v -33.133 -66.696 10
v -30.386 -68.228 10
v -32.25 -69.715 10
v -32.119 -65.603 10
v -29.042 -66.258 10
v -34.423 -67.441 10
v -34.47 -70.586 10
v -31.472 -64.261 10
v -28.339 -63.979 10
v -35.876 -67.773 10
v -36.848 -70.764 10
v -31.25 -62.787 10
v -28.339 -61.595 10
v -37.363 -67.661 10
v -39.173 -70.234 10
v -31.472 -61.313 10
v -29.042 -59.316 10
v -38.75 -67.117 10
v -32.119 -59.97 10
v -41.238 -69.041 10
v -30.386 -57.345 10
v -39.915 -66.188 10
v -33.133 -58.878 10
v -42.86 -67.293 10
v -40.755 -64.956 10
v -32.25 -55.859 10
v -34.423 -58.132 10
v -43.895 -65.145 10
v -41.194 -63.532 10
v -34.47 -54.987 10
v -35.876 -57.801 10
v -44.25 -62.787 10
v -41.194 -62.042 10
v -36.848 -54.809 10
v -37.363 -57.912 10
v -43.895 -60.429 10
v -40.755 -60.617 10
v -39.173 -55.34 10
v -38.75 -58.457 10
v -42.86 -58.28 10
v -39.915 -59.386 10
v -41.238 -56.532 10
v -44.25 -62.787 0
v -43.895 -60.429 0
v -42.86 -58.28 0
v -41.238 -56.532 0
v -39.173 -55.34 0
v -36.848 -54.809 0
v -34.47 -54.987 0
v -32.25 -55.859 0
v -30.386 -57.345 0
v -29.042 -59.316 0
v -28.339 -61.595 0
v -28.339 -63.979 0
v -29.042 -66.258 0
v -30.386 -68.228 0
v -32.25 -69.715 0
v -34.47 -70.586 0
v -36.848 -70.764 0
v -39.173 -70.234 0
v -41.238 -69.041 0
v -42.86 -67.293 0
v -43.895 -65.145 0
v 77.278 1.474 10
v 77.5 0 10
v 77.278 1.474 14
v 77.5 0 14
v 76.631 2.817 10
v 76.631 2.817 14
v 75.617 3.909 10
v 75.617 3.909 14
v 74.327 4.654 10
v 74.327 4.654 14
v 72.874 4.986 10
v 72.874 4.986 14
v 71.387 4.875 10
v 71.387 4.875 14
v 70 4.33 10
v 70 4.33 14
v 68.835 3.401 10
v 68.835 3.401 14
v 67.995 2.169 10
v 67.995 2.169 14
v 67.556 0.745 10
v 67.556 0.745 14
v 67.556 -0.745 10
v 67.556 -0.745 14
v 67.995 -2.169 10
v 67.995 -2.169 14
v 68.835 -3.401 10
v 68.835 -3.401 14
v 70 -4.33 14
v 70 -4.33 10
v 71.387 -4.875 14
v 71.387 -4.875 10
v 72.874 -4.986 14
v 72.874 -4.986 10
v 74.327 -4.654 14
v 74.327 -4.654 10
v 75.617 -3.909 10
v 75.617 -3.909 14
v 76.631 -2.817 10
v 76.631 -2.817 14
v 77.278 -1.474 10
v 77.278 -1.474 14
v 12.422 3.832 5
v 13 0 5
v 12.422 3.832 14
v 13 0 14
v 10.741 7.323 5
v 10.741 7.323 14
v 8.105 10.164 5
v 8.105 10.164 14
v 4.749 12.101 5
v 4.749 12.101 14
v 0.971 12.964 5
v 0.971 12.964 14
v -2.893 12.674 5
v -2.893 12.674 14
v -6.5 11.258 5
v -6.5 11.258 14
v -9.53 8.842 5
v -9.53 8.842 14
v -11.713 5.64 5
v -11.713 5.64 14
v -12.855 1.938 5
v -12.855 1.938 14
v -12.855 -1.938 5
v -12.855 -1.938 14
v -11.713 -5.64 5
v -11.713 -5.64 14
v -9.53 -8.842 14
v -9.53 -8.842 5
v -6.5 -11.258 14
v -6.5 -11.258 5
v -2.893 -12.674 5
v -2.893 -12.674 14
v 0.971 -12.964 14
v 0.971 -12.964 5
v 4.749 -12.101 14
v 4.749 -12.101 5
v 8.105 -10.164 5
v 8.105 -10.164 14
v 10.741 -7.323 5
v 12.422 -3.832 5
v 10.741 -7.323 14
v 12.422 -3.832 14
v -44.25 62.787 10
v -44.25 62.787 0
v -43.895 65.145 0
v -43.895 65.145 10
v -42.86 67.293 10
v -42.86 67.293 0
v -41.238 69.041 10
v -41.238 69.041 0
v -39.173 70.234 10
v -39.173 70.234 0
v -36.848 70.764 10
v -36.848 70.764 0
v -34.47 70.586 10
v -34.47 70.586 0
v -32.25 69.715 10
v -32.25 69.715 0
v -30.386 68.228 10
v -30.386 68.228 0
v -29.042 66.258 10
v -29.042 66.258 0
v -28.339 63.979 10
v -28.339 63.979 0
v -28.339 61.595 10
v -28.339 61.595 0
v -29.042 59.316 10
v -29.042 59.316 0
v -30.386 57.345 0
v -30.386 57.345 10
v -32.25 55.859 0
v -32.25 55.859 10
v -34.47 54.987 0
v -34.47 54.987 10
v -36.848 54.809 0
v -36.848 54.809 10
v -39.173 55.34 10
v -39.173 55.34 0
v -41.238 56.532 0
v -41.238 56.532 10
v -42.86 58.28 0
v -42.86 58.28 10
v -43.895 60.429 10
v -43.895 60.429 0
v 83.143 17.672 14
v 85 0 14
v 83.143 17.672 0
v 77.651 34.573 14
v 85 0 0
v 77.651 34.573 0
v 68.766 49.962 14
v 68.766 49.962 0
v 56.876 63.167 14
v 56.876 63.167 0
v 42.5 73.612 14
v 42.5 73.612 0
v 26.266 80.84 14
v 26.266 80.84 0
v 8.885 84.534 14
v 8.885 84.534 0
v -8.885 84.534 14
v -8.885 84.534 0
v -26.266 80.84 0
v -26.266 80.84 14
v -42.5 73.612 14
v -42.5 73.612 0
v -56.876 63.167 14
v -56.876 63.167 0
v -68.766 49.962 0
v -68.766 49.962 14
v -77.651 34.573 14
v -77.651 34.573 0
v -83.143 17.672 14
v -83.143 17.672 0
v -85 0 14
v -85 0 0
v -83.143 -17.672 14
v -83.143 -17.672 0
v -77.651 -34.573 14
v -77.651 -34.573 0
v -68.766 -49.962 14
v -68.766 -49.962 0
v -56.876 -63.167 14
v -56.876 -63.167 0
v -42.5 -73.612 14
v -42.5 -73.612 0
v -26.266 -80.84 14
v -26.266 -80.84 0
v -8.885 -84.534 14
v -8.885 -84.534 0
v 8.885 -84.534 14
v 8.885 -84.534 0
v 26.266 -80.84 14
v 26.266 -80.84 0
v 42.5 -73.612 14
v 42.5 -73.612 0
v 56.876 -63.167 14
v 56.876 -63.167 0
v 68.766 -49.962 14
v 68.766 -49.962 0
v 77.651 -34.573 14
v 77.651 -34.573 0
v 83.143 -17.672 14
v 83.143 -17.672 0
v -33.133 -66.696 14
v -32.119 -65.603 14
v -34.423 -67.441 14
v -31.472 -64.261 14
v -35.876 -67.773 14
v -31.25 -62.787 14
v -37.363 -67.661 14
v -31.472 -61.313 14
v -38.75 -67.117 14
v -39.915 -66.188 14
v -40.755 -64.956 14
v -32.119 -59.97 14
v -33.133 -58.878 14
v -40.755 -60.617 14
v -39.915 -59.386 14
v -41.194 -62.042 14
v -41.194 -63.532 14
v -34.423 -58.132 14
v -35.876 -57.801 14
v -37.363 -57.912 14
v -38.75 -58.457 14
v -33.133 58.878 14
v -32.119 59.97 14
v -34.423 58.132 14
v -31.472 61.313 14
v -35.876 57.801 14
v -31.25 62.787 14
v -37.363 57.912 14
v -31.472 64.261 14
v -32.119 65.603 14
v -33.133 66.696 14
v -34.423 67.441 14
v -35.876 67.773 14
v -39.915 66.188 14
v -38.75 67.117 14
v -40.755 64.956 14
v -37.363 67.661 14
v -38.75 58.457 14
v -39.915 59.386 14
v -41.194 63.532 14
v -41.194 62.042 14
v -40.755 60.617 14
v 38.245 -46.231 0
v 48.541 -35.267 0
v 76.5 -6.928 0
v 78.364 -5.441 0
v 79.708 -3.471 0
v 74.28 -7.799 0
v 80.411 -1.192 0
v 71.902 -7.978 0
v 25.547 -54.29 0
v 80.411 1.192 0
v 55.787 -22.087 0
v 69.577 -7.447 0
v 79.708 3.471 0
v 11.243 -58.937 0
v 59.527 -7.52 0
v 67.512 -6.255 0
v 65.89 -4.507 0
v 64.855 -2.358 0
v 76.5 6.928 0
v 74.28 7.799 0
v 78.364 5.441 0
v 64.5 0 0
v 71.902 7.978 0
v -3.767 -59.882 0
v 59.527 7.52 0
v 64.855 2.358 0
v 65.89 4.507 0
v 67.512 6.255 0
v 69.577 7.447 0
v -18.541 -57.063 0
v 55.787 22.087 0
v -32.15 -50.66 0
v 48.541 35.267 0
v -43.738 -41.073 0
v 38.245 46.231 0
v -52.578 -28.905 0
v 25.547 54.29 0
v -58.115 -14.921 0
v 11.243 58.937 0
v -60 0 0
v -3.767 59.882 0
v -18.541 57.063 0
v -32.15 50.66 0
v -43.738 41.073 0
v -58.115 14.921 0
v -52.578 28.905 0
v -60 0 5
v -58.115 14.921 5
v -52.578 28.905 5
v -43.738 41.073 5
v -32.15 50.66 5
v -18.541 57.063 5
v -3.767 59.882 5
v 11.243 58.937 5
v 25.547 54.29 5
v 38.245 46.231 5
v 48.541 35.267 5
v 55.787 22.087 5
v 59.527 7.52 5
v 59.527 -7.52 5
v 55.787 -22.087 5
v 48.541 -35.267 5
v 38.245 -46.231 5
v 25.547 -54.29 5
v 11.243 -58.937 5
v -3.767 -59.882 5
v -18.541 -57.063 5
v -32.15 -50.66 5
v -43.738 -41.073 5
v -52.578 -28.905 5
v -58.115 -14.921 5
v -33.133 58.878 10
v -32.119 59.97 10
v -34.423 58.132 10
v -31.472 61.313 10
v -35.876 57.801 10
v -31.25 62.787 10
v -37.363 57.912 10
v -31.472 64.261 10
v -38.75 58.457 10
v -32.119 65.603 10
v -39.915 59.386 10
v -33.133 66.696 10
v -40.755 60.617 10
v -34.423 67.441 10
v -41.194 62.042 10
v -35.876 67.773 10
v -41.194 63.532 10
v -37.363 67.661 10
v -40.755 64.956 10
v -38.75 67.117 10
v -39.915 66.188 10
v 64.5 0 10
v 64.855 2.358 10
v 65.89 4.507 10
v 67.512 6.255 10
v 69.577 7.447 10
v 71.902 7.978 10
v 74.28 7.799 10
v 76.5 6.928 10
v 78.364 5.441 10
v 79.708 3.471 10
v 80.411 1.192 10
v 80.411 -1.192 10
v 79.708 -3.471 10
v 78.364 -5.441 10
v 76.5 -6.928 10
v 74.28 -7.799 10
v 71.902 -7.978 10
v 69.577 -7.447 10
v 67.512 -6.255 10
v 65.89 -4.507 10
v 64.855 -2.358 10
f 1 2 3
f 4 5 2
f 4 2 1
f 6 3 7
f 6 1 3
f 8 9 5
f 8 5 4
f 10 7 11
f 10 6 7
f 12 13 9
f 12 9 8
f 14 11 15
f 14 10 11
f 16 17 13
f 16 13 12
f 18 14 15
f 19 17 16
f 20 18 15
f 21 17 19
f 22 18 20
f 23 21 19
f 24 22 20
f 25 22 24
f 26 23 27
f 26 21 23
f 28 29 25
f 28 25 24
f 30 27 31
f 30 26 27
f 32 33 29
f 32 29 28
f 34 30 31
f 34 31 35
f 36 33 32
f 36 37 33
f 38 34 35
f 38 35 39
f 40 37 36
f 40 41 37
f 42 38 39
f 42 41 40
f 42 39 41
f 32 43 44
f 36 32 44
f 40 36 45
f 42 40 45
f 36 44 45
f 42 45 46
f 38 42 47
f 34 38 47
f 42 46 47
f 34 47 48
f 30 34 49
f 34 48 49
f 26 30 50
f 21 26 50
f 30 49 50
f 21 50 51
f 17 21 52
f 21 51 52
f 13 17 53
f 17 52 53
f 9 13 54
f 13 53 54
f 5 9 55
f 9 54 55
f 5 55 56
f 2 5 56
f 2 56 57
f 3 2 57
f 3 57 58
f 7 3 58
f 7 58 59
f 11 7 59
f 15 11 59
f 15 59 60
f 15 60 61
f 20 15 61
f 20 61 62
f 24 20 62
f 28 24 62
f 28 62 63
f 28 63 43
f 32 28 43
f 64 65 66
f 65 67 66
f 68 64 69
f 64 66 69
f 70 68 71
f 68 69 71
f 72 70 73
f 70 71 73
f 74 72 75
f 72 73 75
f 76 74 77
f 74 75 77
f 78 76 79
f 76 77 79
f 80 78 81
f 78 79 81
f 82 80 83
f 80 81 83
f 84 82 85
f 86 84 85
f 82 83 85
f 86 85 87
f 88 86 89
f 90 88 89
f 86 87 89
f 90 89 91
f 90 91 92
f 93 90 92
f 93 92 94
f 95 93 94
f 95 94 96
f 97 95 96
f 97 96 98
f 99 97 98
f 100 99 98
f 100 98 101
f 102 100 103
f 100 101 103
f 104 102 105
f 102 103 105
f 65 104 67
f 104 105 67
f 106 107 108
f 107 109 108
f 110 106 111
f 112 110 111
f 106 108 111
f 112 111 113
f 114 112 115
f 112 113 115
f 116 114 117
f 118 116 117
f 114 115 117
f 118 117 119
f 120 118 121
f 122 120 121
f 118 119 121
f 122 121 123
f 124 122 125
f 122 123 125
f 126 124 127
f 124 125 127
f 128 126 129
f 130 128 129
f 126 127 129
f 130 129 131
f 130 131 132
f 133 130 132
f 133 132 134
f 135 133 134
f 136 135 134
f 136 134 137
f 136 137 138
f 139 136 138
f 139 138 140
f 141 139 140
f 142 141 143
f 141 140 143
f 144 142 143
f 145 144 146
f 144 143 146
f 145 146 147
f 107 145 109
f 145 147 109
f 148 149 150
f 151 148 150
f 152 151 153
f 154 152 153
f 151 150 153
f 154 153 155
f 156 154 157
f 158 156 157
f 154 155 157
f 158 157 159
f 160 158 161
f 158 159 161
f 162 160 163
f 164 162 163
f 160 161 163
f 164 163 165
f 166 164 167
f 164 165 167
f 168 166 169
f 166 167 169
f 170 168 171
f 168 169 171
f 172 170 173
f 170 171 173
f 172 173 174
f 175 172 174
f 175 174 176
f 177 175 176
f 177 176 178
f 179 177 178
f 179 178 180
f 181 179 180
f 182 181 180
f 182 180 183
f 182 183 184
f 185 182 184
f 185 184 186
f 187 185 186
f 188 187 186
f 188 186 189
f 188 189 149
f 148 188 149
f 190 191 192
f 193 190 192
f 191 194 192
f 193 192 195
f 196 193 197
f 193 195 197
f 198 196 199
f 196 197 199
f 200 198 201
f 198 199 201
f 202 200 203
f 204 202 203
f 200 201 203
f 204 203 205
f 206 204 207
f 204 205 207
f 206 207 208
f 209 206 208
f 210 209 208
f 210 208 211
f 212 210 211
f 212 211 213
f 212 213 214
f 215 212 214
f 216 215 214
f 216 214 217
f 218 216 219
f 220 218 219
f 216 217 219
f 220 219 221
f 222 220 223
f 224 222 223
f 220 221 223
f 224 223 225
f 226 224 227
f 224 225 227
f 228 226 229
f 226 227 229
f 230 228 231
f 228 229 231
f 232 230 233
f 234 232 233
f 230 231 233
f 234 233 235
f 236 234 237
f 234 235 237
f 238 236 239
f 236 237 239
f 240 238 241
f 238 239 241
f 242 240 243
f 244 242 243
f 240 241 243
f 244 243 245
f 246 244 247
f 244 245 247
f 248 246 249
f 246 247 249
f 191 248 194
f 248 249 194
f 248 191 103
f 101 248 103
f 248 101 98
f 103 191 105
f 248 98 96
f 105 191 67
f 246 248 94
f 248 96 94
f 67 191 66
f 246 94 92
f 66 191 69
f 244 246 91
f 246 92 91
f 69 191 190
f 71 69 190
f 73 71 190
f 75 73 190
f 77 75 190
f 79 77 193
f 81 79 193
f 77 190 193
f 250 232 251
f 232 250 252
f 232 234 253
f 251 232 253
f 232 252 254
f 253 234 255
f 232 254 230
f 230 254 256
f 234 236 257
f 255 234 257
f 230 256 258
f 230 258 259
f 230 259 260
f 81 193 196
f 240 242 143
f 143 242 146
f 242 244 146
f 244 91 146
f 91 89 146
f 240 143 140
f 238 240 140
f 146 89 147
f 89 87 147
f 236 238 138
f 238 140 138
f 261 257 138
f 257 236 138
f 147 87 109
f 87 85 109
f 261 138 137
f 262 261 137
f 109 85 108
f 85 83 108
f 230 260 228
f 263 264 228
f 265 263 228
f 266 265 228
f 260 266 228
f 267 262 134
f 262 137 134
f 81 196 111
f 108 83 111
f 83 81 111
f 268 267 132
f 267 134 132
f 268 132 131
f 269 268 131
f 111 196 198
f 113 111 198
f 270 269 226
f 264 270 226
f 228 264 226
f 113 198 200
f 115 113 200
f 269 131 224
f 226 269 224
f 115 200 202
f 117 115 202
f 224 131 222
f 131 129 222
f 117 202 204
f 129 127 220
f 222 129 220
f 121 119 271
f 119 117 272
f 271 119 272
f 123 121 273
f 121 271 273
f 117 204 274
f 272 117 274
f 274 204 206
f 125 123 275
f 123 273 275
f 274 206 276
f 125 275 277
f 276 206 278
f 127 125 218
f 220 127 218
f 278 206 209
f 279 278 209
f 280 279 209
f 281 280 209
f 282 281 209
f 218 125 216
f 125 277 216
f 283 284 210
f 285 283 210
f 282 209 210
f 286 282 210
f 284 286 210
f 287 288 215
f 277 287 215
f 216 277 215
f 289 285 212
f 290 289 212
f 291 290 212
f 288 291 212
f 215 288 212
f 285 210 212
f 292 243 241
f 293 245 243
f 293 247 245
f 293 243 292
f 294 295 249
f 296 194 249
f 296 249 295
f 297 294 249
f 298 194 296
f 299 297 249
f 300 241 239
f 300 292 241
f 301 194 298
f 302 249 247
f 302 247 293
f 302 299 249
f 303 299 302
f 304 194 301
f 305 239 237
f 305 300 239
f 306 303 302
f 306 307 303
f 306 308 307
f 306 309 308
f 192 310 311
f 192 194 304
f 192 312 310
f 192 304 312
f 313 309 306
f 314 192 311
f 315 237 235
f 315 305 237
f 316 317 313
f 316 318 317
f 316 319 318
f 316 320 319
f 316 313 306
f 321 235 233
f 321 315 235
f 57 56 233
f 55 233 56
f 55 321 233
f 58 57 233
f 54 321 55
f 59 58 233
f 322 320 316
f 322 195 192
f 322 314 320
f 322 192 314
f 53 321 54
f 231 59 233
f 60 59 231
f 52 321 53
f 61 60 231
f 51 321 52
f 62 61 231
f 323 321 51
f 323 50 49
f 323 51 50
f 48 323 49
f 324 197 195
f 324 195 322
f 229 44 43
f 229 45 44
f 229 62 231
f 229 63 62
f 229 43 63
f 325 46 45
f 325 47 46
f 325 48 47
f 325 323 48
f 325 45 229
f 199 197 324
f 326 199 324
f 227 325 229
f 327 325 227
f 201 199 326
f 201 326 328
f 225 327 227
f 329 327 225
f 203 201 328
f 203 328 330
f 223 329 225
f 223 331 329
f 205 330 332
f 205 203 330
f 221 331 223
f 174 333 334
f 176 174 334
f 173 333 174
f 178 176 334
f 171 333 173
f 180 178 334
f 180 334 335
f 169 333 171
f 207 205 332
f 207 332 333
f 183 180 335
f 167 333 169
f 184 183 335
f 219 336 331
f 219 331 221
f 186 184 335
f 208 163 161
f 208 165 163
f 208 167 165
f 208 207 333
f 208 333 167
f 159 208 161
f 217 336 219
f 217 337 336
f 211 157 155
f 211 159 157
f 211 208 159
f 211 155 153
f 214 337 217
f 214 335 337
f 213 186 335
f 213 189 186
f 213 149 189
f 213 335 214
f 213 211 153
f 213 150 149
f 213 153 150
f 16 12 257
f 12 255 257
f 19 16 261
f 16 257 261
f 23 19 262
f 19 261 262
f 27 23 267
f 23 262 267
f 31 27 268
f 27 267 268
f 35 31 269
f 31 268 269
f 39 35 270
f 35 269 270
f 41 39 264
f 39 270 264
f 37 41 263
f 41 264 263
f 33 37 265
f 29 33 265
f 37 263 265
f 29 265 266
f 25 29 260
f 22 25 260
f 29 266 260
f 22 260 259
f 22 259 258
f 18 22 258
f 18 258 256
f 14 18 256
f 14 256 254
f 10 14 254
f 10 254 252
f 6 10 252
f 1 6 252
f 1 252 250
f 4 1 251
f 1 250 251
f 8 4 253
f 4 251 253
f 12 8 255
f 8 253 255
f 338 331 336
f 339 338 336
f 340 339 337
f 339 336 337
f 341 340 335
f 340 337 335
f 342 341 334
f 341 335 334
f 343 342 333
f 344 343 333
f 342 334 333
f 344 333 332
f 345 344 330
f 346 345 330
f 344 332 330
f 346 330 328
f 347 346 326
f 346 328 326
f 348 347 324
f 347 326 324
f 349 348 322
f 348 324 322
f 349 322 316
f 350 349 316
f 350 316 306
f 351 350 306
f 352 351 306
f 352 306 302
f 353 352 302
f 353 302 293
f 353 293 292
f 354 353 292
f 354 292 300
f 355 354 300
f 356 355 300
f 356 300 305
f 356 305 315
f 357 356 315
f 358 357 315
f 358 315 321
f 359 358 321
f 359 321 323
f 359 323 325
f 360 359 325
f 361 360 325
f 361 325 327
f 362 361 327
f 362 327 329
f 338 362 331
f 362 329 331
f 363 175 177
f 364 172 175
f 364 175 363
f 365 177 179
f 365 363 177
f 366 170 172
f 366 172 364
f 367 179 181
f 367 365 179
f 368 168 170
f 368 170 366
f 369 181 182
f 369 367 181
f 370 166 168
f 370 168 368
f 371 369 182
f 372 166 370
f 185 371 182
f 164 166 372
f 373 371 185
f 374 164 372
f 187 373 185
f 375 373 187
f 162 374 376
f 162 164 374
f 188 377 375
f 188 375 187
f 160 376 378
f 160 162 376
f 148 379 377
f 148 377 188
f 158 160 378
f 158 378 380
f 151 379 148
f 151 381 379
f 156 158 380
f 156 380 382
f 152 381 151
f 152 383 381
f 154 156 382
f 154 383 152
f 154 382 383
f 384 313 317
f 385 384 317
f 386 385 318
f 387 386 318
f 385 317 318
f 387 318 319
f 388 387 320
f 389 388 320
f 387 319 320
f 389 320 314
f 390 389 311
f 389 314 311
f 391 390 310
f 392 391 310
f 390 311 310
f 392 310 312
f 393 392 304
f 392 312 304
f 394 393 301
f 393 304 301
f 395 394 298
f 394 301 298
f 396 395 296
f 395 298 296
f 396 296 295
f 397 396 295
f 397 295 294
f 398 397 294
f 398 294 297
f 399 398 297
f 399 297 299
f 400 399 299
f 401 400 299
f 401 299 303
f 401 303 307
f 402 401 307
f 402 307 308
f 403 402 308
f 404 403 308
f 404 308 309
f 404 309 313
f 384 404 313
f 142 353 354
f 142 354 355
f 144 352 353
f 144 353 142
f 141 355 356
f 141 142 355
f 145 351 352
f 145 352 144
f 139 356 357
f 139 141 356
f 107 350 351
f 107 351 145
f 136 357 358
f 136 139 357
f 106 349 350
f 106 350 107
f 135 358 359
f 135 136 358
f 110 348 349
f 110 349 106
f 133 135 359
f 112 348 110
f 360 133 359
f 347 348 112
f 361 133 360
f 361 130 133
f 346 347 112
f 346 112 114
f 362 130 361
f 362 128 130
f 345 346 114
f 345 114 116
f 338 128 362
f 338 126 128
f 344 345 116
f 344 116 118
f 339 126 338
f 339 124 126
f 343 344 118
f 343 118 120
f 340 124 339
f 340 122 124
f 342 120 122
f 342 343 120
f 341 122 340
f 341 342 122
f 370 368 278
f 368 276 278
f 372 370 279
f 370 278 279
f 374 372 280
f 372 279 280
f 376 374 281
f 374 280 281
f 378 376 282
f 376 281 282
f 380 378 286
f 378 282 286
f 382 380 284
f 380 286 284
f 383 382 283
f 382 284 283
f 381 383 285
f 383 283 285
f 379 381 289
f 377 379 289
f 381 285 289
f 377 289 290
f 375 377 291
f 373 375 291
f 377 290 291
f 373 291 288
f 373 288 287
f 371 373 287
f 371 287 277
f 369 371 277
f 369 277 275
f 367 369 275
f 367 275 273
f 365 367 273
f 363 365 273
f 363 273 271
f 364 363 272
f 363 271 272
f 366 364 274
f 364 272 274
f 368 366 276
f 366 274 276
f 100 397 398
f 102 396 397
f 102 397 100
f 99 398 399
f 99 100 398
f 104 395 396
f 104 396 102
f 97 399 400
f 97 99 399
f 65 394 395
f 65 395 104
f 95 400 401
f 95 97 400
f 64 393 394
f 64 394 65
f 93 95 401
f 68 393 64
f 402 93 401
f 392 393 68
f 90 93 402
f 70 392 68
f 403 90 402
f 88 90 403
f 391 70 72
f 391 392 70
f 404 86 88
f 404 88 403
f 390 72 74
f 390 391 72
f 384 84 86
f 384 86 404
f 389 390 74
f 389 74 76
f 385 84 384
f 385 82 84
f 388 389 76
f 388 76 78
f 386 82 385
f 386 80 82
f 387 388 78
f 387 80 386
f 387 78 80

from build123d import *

# Parameters (mm, degrees)
SKETCH_1_W                    = 85
SKETCH_1_H                    = 14
HOLE_WIZARD_M24_1_D           = 26
HOLE_WIZARD_M24_1_CBORE_D     = 120
HOLE_WIZARD_M24_1_CBORE_DEPTH = 5
HOLE_WIZARD_M8_1_D            = 10
HOLE_WIZARD_M8_1_CBORE_D      = 16
HOLE_WIZARD_M8_1_CBORE_DEPTH  = 10


with BuildPart() as part:
    # 草图1 → 旋转1 (revolve)
    with BuildSketch(Plane(origin=(0, 0, 0), x_dir=(1, 0, 0), z_dir=(0, 1, 0))):
        with Locations((42.5, -7)):
            Rectangle(SKETCH_1_W, SKETCH_1_H)
    revolve(axis=Axis((0, 0, 0), (0, 0, 1)))

    # M24 六角头螺栓的柱形沉头孔1 (through all)
    with Locations(Plane(origin=(0, 0, 0), x_dir=(-1, 0, 0), z_dir=(0, 0, -1))):
        with Locations((0, 0)):
            CounterBoreHole(HOLE_WIZARD_M24_1_D / 2, HOLE_WIZARD_M24_1_CBORE_D / 2, HOLE_WIZARD_M24_1_CBORE_DEPTH)

    # M8 六角头螺栓的柱形沉头孔1 (through all)
    with Locations(Plane(origin=(0, 0, 0), x_dir=(-1, 0, 0), z_dir=(0, 0, -1))):
        with Locations((36.25, 62.786841774), (-72.5, 0), (36.25, -62.786841774)):
            CounterBoreHole(HOLE_WIZARD_M8_1_D / 2, HOLE_WIZARD_M8_1_CBORE_D / 2, HOLE_WIZARD_M8_1_CBORE_DEPTH)


solid = part.part
